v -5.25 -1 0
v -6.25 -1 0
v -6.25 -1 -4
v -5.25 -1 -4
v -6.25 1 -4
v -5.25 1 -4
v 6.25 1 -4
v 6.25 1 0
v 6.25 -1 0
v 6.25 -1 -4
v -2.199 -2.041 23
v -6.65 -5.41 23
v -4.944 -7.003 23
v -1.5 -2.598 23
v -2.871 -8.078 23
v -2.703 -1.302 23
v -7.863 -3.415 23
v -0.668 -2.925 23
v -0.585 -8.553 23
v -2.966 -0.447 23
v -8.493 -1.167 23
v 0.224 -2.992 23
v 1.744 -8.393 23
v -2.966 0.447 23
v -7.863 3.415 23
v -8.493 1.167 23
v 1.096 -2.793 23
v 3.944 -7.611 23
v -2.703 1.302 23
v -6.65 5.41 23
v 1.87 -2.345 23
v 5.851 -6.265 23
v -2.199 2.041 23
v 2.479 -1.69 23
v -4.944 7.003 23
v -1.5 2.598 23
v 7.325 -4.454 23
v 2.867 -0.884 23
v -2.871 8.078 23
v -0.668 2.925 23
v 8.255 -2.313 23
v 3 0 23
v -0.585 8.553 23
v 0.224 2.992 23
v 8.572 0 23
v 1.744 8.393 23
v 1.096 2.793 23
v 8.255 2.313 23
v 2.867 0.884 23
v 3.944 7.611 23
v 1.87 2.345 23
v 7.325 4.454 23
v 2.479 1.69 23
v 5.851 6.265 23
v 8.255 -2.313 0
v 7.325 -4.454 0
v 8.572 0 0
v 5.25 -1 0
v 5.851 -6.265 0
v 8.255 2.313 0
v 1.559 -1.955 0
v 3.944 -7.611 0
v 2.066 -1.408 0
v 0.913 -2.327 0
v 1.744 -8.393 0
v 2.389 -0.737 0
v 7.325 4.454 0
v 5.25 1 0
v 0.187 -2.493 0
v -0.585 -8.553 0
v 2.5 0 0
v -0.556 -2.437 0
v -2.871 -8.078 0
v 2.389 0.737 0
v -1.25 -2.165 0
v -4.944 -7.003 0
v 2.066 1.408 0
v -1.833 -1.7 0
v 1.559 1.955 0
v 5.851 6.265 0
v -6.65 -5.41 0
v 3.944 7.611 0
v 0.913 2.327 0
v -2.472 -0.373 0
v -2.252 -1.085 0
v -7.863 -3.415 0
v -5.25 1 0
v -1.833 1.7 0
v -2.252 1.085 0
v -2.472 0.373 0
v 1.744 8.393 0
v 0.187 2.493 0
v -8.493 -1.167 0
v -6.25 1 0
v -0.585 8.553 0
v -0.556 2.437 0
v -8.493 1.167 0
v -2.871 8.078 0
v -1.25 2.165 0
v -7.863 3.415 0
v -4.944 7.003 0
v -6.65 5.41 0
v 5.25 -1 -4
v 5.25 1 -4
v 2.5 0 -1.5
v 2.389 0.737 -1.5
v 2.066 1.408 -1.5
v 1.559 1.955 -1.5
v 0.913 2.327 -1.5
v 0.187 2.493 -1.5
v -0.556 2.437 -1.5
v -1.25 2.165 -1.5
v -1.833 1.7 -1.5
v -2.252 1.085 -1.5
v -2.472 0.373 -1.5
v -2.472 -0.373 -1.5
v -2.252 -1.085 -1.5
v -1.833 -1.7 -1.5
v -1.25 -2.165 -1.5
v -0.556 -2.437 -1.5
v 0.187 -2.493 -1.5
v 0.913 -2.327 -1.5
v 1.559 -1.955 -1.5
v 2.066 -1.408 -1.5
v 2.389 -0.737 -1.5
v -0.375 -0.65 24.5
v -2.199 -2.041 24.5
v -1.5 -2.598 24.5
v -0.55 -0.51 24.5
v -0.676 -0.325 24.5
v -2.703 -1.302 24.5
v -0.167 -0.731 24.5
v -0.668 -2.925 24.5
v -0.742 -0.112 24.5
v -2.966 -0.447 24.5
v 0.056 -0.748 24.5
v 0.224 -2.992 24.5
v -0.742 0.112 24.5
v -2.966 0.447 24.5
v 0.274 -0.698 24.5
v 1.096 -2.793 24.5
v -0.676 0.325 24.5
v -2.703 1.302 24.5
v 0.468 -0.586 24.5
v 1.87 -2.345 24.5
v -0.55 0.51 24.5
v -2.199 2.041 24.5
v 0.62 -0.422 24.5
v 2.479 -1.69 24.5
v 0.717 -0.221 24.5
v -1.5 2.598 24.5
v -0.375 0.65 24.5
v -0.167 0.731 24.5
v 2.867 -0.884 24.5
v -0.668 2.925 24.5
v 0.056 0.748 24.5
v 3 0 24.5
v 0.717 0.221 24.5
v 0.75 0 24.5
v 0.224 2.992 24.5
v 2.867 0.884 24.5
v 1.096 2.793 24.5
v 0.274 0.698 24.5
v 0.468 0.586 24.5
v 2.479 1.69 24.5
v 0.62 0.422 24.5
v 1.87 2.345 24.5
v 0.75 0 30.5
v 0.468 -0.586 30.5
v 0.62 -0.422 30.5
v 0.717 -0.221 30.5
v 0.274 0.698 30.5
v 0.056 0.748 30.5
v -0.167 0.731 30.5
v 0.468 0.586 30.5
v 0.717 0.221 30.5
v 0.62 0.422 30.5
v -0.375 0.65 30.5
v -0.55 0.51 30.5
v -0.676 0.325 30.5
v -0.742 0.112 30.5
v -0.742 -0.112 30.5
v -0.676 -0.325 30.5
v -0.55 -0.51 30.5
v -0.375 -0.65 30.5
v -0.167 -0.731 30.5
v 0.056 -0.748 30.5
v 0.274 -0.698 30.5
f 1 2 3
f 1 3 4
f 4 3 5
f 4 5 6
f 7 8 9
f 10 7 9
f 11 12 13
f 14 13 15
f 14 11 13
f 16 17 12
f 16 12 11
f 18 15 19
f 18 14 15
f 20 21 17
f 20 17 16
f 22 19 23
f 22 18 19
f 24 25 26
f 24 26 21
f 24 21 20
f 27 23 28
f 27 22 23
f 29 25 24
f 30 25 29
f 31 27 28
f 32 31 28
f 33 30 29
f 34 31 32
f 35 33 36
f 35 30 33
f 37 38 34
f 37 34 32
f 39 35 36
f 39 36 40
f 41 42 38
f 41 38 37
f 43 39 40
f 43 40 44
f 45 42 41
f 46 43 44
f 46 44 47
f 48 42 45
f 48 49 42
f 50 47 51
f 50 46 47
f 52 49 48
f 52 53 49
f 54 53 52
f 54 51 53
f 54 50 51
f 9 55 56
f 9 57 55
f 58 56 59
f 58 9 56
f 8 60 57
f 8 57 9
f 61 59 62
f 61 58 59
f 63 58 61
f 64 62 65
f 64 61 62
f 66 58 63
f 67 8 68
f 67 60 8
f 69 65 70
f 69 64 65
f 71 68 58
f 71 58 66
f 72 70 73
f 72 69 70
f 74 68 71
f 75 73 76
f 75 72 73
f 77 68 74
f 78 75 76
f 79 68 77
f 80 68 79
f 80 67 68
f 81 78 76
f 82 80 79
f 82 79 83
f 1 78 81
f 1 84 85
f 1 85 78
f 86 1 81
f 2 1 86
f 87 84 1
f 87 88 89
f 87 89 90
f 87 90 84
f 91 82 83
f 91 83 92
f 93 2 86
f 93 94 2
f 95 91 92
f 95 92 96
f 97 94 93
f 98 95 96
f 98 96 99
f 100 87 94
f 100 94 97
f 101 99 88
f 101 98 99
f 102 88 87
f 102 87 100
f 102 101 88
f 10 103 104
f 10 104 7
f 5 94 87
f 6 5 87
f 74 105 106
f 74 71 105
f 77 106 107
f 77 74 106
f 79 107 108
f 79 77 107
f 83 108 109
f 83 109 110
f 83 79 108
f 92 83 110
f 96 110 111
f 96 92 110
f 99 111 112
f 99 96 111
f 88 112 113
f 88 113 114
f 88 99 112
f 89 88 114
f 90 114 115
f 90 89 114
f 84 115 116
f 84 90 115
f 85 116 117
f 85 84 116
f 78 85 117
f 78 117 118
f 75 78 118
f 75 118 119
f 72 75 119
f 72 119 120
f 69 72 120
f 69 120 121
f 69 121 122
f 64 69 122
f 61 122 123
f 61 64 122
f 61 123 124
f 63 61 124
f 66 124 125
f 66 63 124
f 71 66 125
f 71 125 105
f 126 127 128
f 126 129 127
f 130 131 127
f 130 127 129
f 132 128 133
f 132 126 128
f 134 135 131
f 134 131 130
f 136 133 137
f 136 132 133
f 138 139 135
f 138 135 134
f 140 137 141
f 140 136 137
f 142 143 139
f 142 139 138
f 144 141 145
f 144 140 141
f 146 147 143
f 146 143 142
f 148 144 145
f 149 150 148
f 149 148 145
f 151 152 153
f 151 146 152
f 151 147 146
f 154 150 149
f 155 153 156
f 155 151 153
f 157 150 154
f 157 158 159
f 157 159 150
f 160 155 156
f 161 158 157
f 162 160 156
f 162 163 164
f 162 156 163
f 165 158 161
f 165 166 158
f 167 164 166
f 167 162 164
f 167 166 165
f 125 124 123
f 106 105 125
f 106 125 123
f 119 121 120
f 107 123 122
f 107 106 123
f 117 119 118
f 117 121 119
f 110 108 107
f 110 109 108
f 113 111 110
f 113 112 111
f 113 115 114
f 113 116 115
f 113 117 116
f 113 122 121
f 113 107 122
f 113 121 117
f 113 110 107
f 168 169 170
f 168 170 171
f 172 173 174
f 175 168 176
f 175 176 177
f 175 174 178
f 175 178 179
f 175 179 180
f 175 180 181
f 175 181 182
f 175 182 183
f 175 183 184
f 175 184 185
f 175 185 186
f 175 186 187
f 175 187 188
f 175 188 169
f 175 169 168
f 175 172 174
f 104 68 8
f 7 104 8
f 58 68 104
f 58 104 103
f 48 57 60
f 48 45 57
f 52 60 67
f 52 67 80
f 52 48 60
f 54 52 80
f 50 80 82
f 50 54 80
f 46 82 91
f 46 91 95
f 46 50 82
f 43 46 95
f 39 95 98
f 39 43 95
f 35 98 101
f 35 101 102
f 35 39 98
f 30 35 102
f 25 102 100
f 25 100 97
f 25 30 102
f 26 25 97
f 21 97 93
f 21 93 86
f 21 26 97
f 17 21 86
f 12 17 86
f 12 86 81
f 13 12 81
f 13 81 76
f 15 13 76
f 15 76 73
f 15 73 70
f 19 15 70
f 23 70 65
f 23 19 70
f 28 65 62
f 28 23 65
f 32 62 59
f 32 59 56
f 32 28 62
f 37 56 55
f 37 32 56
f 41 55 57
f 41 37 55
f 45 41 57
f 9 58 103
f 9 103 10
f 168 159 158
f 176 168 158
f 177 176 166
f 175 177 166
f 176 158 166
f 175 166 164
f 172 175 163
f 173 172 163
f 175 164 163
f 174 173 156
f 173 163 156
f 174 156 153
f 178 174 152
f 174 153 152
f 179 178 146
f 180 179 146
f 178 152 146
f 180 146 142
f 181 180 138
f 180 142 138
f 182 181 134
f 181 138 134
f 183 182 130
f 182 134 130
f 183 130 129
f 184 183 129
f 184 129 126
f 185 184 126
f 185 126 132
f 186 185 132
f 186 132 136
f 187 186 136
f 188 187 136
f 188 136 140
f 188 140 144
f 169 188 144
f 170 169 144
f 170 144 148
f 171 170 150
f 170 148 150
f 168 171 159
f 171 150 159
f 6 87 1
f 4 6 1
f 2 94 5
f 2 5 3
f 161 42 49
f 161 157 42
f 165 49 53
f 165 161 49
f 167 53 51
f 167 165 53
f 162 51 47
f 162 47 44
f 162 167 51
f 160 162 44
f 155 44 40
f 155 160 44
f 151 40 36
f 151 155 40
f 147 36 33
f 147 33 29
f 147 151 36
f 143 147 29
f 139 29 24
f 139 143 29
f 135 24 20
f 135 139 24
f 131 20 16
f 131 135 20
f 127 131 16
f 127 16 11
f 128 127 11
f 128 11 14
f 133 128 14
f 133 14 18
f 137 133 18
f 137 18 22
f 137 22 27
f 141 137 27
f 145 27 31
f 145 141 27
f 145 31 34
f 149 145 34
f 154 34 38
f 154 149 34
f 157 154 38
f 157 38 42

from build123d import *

# Parameters (mm, degrees)
F2_R     = 0.75
F3_DEPTH = 6
F4_W     = 1
F4_H     = 2
F5_DEPTH = 4


with BuildPart() as f1:
    # F0 (on Front) → F1 (revolve)
    with BuildSketch(Plane.XZ):
        Polygon((2.5, -1.5), (2.5, 0), (8.5725, 0), (8.5725, 23), (3, 23), (3, 24.5), (0, 24.5), (0, -1.5), align=None)
    revolve(axis=Axis((0, 0, 11.5), (0, 0, 1)))

    # F2 (on face) → F3 (join)
    with BuildSketch(Plane.XY.offset(24.5)):
        Circle(F2_R)
    extrude(amount=F3_DEPTH)

    # F4 (on face) → F5 (join)
    with BuildSketch(Plane(origin=(0, 0, 0), x_dir=(1, 0, 0), z_dir=(0, 0, -1))):
        with Locations((5.75, 0)):
            Rectangle(F4_W, F4_H)
        with Locations((-5.75, 0)):
            Rectangle(F4_W, F4_H)
    extrude(amount=F5_DEPTH)


solid = f1.part
